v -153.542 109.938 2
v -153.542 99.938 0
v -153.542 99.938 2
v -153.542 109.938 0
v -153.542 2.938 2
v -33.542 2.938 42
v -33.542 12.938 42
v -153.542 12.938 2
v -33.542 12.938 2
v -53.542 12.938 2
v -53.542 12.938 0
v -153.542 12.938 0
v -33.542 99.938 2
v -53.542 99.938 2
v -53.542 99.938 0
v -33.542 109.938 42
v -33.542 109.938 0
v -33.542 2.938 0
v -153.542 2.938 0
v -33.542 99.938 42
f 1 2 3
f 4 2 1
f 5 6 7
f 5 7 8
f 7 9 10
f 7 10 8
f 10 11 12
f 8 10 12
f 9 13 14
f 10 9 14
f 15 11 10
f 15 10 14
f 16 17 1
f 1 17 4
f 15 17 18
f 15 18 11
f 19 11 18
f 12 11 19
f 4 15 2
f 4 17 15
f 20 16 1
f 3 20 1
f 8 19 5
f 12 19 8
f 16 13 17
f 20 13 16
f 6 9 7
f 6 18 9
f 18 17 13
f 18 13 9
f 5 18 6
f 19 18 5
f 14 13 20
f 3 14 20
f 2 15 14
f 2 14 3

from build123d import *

# Parameters (mm, degrees)
BOSS_EXTRUDE1_DEPTH = 2
BOSS_EXTRUDE2_DEPTH = 10
BOSS_EXTRUDE3_START = -107
BOSS_EXTRUDE3_DEPTH = 10


with BuildPart() as part:
    # Sketch1 → Boss-Extrude1 (new body)
    with BuildSketch(Plane.XY):
        Polygon((-33.541898883, 109.937648966), (-33.541898883, 2.937648966), (-153.541898883, 2.937648966), (-153.541898883, 12.937648966), (-53.541898883, 12.937648966), (-53.541898883, 99.937648966), (-153.541898883, 99.937648966), (-153.541898883, 109.937648966), align=None)
    extrude(amount=BOSS_EXTRUDE1_DEPTH)

    # Sketch2 → Boss-Extrude2 (add)
    with BuildSketch(Plane(origin=(0, 109.937648966, 0), x_dir=(1, 0, 0), z_dir=(0, 1, 0))):
        Polygon((-153.541898883, -2), (-33.541898883, -2), (-33.541898883, -42), align=None)
    extrude(amount=-BOSS_EXTRUDE2_DEPTH)

    # Sketch2<2> → Boss-Extrude3 (add)
    with BuildSketch(Plane(origin=(0, 109.937648966, 0), x_dir=(1, 0, 0), z_dir=(0, 1, 0)).offset(BOSS_EXTRUDE3_START)):
        Polygon((-153.541898883, -2), (-33.541898883, -2), (-33.541898883, -42), align=None)
    extrude(amount=BOSS_EXTRUDE3_DEPTH)


solid = part.part
